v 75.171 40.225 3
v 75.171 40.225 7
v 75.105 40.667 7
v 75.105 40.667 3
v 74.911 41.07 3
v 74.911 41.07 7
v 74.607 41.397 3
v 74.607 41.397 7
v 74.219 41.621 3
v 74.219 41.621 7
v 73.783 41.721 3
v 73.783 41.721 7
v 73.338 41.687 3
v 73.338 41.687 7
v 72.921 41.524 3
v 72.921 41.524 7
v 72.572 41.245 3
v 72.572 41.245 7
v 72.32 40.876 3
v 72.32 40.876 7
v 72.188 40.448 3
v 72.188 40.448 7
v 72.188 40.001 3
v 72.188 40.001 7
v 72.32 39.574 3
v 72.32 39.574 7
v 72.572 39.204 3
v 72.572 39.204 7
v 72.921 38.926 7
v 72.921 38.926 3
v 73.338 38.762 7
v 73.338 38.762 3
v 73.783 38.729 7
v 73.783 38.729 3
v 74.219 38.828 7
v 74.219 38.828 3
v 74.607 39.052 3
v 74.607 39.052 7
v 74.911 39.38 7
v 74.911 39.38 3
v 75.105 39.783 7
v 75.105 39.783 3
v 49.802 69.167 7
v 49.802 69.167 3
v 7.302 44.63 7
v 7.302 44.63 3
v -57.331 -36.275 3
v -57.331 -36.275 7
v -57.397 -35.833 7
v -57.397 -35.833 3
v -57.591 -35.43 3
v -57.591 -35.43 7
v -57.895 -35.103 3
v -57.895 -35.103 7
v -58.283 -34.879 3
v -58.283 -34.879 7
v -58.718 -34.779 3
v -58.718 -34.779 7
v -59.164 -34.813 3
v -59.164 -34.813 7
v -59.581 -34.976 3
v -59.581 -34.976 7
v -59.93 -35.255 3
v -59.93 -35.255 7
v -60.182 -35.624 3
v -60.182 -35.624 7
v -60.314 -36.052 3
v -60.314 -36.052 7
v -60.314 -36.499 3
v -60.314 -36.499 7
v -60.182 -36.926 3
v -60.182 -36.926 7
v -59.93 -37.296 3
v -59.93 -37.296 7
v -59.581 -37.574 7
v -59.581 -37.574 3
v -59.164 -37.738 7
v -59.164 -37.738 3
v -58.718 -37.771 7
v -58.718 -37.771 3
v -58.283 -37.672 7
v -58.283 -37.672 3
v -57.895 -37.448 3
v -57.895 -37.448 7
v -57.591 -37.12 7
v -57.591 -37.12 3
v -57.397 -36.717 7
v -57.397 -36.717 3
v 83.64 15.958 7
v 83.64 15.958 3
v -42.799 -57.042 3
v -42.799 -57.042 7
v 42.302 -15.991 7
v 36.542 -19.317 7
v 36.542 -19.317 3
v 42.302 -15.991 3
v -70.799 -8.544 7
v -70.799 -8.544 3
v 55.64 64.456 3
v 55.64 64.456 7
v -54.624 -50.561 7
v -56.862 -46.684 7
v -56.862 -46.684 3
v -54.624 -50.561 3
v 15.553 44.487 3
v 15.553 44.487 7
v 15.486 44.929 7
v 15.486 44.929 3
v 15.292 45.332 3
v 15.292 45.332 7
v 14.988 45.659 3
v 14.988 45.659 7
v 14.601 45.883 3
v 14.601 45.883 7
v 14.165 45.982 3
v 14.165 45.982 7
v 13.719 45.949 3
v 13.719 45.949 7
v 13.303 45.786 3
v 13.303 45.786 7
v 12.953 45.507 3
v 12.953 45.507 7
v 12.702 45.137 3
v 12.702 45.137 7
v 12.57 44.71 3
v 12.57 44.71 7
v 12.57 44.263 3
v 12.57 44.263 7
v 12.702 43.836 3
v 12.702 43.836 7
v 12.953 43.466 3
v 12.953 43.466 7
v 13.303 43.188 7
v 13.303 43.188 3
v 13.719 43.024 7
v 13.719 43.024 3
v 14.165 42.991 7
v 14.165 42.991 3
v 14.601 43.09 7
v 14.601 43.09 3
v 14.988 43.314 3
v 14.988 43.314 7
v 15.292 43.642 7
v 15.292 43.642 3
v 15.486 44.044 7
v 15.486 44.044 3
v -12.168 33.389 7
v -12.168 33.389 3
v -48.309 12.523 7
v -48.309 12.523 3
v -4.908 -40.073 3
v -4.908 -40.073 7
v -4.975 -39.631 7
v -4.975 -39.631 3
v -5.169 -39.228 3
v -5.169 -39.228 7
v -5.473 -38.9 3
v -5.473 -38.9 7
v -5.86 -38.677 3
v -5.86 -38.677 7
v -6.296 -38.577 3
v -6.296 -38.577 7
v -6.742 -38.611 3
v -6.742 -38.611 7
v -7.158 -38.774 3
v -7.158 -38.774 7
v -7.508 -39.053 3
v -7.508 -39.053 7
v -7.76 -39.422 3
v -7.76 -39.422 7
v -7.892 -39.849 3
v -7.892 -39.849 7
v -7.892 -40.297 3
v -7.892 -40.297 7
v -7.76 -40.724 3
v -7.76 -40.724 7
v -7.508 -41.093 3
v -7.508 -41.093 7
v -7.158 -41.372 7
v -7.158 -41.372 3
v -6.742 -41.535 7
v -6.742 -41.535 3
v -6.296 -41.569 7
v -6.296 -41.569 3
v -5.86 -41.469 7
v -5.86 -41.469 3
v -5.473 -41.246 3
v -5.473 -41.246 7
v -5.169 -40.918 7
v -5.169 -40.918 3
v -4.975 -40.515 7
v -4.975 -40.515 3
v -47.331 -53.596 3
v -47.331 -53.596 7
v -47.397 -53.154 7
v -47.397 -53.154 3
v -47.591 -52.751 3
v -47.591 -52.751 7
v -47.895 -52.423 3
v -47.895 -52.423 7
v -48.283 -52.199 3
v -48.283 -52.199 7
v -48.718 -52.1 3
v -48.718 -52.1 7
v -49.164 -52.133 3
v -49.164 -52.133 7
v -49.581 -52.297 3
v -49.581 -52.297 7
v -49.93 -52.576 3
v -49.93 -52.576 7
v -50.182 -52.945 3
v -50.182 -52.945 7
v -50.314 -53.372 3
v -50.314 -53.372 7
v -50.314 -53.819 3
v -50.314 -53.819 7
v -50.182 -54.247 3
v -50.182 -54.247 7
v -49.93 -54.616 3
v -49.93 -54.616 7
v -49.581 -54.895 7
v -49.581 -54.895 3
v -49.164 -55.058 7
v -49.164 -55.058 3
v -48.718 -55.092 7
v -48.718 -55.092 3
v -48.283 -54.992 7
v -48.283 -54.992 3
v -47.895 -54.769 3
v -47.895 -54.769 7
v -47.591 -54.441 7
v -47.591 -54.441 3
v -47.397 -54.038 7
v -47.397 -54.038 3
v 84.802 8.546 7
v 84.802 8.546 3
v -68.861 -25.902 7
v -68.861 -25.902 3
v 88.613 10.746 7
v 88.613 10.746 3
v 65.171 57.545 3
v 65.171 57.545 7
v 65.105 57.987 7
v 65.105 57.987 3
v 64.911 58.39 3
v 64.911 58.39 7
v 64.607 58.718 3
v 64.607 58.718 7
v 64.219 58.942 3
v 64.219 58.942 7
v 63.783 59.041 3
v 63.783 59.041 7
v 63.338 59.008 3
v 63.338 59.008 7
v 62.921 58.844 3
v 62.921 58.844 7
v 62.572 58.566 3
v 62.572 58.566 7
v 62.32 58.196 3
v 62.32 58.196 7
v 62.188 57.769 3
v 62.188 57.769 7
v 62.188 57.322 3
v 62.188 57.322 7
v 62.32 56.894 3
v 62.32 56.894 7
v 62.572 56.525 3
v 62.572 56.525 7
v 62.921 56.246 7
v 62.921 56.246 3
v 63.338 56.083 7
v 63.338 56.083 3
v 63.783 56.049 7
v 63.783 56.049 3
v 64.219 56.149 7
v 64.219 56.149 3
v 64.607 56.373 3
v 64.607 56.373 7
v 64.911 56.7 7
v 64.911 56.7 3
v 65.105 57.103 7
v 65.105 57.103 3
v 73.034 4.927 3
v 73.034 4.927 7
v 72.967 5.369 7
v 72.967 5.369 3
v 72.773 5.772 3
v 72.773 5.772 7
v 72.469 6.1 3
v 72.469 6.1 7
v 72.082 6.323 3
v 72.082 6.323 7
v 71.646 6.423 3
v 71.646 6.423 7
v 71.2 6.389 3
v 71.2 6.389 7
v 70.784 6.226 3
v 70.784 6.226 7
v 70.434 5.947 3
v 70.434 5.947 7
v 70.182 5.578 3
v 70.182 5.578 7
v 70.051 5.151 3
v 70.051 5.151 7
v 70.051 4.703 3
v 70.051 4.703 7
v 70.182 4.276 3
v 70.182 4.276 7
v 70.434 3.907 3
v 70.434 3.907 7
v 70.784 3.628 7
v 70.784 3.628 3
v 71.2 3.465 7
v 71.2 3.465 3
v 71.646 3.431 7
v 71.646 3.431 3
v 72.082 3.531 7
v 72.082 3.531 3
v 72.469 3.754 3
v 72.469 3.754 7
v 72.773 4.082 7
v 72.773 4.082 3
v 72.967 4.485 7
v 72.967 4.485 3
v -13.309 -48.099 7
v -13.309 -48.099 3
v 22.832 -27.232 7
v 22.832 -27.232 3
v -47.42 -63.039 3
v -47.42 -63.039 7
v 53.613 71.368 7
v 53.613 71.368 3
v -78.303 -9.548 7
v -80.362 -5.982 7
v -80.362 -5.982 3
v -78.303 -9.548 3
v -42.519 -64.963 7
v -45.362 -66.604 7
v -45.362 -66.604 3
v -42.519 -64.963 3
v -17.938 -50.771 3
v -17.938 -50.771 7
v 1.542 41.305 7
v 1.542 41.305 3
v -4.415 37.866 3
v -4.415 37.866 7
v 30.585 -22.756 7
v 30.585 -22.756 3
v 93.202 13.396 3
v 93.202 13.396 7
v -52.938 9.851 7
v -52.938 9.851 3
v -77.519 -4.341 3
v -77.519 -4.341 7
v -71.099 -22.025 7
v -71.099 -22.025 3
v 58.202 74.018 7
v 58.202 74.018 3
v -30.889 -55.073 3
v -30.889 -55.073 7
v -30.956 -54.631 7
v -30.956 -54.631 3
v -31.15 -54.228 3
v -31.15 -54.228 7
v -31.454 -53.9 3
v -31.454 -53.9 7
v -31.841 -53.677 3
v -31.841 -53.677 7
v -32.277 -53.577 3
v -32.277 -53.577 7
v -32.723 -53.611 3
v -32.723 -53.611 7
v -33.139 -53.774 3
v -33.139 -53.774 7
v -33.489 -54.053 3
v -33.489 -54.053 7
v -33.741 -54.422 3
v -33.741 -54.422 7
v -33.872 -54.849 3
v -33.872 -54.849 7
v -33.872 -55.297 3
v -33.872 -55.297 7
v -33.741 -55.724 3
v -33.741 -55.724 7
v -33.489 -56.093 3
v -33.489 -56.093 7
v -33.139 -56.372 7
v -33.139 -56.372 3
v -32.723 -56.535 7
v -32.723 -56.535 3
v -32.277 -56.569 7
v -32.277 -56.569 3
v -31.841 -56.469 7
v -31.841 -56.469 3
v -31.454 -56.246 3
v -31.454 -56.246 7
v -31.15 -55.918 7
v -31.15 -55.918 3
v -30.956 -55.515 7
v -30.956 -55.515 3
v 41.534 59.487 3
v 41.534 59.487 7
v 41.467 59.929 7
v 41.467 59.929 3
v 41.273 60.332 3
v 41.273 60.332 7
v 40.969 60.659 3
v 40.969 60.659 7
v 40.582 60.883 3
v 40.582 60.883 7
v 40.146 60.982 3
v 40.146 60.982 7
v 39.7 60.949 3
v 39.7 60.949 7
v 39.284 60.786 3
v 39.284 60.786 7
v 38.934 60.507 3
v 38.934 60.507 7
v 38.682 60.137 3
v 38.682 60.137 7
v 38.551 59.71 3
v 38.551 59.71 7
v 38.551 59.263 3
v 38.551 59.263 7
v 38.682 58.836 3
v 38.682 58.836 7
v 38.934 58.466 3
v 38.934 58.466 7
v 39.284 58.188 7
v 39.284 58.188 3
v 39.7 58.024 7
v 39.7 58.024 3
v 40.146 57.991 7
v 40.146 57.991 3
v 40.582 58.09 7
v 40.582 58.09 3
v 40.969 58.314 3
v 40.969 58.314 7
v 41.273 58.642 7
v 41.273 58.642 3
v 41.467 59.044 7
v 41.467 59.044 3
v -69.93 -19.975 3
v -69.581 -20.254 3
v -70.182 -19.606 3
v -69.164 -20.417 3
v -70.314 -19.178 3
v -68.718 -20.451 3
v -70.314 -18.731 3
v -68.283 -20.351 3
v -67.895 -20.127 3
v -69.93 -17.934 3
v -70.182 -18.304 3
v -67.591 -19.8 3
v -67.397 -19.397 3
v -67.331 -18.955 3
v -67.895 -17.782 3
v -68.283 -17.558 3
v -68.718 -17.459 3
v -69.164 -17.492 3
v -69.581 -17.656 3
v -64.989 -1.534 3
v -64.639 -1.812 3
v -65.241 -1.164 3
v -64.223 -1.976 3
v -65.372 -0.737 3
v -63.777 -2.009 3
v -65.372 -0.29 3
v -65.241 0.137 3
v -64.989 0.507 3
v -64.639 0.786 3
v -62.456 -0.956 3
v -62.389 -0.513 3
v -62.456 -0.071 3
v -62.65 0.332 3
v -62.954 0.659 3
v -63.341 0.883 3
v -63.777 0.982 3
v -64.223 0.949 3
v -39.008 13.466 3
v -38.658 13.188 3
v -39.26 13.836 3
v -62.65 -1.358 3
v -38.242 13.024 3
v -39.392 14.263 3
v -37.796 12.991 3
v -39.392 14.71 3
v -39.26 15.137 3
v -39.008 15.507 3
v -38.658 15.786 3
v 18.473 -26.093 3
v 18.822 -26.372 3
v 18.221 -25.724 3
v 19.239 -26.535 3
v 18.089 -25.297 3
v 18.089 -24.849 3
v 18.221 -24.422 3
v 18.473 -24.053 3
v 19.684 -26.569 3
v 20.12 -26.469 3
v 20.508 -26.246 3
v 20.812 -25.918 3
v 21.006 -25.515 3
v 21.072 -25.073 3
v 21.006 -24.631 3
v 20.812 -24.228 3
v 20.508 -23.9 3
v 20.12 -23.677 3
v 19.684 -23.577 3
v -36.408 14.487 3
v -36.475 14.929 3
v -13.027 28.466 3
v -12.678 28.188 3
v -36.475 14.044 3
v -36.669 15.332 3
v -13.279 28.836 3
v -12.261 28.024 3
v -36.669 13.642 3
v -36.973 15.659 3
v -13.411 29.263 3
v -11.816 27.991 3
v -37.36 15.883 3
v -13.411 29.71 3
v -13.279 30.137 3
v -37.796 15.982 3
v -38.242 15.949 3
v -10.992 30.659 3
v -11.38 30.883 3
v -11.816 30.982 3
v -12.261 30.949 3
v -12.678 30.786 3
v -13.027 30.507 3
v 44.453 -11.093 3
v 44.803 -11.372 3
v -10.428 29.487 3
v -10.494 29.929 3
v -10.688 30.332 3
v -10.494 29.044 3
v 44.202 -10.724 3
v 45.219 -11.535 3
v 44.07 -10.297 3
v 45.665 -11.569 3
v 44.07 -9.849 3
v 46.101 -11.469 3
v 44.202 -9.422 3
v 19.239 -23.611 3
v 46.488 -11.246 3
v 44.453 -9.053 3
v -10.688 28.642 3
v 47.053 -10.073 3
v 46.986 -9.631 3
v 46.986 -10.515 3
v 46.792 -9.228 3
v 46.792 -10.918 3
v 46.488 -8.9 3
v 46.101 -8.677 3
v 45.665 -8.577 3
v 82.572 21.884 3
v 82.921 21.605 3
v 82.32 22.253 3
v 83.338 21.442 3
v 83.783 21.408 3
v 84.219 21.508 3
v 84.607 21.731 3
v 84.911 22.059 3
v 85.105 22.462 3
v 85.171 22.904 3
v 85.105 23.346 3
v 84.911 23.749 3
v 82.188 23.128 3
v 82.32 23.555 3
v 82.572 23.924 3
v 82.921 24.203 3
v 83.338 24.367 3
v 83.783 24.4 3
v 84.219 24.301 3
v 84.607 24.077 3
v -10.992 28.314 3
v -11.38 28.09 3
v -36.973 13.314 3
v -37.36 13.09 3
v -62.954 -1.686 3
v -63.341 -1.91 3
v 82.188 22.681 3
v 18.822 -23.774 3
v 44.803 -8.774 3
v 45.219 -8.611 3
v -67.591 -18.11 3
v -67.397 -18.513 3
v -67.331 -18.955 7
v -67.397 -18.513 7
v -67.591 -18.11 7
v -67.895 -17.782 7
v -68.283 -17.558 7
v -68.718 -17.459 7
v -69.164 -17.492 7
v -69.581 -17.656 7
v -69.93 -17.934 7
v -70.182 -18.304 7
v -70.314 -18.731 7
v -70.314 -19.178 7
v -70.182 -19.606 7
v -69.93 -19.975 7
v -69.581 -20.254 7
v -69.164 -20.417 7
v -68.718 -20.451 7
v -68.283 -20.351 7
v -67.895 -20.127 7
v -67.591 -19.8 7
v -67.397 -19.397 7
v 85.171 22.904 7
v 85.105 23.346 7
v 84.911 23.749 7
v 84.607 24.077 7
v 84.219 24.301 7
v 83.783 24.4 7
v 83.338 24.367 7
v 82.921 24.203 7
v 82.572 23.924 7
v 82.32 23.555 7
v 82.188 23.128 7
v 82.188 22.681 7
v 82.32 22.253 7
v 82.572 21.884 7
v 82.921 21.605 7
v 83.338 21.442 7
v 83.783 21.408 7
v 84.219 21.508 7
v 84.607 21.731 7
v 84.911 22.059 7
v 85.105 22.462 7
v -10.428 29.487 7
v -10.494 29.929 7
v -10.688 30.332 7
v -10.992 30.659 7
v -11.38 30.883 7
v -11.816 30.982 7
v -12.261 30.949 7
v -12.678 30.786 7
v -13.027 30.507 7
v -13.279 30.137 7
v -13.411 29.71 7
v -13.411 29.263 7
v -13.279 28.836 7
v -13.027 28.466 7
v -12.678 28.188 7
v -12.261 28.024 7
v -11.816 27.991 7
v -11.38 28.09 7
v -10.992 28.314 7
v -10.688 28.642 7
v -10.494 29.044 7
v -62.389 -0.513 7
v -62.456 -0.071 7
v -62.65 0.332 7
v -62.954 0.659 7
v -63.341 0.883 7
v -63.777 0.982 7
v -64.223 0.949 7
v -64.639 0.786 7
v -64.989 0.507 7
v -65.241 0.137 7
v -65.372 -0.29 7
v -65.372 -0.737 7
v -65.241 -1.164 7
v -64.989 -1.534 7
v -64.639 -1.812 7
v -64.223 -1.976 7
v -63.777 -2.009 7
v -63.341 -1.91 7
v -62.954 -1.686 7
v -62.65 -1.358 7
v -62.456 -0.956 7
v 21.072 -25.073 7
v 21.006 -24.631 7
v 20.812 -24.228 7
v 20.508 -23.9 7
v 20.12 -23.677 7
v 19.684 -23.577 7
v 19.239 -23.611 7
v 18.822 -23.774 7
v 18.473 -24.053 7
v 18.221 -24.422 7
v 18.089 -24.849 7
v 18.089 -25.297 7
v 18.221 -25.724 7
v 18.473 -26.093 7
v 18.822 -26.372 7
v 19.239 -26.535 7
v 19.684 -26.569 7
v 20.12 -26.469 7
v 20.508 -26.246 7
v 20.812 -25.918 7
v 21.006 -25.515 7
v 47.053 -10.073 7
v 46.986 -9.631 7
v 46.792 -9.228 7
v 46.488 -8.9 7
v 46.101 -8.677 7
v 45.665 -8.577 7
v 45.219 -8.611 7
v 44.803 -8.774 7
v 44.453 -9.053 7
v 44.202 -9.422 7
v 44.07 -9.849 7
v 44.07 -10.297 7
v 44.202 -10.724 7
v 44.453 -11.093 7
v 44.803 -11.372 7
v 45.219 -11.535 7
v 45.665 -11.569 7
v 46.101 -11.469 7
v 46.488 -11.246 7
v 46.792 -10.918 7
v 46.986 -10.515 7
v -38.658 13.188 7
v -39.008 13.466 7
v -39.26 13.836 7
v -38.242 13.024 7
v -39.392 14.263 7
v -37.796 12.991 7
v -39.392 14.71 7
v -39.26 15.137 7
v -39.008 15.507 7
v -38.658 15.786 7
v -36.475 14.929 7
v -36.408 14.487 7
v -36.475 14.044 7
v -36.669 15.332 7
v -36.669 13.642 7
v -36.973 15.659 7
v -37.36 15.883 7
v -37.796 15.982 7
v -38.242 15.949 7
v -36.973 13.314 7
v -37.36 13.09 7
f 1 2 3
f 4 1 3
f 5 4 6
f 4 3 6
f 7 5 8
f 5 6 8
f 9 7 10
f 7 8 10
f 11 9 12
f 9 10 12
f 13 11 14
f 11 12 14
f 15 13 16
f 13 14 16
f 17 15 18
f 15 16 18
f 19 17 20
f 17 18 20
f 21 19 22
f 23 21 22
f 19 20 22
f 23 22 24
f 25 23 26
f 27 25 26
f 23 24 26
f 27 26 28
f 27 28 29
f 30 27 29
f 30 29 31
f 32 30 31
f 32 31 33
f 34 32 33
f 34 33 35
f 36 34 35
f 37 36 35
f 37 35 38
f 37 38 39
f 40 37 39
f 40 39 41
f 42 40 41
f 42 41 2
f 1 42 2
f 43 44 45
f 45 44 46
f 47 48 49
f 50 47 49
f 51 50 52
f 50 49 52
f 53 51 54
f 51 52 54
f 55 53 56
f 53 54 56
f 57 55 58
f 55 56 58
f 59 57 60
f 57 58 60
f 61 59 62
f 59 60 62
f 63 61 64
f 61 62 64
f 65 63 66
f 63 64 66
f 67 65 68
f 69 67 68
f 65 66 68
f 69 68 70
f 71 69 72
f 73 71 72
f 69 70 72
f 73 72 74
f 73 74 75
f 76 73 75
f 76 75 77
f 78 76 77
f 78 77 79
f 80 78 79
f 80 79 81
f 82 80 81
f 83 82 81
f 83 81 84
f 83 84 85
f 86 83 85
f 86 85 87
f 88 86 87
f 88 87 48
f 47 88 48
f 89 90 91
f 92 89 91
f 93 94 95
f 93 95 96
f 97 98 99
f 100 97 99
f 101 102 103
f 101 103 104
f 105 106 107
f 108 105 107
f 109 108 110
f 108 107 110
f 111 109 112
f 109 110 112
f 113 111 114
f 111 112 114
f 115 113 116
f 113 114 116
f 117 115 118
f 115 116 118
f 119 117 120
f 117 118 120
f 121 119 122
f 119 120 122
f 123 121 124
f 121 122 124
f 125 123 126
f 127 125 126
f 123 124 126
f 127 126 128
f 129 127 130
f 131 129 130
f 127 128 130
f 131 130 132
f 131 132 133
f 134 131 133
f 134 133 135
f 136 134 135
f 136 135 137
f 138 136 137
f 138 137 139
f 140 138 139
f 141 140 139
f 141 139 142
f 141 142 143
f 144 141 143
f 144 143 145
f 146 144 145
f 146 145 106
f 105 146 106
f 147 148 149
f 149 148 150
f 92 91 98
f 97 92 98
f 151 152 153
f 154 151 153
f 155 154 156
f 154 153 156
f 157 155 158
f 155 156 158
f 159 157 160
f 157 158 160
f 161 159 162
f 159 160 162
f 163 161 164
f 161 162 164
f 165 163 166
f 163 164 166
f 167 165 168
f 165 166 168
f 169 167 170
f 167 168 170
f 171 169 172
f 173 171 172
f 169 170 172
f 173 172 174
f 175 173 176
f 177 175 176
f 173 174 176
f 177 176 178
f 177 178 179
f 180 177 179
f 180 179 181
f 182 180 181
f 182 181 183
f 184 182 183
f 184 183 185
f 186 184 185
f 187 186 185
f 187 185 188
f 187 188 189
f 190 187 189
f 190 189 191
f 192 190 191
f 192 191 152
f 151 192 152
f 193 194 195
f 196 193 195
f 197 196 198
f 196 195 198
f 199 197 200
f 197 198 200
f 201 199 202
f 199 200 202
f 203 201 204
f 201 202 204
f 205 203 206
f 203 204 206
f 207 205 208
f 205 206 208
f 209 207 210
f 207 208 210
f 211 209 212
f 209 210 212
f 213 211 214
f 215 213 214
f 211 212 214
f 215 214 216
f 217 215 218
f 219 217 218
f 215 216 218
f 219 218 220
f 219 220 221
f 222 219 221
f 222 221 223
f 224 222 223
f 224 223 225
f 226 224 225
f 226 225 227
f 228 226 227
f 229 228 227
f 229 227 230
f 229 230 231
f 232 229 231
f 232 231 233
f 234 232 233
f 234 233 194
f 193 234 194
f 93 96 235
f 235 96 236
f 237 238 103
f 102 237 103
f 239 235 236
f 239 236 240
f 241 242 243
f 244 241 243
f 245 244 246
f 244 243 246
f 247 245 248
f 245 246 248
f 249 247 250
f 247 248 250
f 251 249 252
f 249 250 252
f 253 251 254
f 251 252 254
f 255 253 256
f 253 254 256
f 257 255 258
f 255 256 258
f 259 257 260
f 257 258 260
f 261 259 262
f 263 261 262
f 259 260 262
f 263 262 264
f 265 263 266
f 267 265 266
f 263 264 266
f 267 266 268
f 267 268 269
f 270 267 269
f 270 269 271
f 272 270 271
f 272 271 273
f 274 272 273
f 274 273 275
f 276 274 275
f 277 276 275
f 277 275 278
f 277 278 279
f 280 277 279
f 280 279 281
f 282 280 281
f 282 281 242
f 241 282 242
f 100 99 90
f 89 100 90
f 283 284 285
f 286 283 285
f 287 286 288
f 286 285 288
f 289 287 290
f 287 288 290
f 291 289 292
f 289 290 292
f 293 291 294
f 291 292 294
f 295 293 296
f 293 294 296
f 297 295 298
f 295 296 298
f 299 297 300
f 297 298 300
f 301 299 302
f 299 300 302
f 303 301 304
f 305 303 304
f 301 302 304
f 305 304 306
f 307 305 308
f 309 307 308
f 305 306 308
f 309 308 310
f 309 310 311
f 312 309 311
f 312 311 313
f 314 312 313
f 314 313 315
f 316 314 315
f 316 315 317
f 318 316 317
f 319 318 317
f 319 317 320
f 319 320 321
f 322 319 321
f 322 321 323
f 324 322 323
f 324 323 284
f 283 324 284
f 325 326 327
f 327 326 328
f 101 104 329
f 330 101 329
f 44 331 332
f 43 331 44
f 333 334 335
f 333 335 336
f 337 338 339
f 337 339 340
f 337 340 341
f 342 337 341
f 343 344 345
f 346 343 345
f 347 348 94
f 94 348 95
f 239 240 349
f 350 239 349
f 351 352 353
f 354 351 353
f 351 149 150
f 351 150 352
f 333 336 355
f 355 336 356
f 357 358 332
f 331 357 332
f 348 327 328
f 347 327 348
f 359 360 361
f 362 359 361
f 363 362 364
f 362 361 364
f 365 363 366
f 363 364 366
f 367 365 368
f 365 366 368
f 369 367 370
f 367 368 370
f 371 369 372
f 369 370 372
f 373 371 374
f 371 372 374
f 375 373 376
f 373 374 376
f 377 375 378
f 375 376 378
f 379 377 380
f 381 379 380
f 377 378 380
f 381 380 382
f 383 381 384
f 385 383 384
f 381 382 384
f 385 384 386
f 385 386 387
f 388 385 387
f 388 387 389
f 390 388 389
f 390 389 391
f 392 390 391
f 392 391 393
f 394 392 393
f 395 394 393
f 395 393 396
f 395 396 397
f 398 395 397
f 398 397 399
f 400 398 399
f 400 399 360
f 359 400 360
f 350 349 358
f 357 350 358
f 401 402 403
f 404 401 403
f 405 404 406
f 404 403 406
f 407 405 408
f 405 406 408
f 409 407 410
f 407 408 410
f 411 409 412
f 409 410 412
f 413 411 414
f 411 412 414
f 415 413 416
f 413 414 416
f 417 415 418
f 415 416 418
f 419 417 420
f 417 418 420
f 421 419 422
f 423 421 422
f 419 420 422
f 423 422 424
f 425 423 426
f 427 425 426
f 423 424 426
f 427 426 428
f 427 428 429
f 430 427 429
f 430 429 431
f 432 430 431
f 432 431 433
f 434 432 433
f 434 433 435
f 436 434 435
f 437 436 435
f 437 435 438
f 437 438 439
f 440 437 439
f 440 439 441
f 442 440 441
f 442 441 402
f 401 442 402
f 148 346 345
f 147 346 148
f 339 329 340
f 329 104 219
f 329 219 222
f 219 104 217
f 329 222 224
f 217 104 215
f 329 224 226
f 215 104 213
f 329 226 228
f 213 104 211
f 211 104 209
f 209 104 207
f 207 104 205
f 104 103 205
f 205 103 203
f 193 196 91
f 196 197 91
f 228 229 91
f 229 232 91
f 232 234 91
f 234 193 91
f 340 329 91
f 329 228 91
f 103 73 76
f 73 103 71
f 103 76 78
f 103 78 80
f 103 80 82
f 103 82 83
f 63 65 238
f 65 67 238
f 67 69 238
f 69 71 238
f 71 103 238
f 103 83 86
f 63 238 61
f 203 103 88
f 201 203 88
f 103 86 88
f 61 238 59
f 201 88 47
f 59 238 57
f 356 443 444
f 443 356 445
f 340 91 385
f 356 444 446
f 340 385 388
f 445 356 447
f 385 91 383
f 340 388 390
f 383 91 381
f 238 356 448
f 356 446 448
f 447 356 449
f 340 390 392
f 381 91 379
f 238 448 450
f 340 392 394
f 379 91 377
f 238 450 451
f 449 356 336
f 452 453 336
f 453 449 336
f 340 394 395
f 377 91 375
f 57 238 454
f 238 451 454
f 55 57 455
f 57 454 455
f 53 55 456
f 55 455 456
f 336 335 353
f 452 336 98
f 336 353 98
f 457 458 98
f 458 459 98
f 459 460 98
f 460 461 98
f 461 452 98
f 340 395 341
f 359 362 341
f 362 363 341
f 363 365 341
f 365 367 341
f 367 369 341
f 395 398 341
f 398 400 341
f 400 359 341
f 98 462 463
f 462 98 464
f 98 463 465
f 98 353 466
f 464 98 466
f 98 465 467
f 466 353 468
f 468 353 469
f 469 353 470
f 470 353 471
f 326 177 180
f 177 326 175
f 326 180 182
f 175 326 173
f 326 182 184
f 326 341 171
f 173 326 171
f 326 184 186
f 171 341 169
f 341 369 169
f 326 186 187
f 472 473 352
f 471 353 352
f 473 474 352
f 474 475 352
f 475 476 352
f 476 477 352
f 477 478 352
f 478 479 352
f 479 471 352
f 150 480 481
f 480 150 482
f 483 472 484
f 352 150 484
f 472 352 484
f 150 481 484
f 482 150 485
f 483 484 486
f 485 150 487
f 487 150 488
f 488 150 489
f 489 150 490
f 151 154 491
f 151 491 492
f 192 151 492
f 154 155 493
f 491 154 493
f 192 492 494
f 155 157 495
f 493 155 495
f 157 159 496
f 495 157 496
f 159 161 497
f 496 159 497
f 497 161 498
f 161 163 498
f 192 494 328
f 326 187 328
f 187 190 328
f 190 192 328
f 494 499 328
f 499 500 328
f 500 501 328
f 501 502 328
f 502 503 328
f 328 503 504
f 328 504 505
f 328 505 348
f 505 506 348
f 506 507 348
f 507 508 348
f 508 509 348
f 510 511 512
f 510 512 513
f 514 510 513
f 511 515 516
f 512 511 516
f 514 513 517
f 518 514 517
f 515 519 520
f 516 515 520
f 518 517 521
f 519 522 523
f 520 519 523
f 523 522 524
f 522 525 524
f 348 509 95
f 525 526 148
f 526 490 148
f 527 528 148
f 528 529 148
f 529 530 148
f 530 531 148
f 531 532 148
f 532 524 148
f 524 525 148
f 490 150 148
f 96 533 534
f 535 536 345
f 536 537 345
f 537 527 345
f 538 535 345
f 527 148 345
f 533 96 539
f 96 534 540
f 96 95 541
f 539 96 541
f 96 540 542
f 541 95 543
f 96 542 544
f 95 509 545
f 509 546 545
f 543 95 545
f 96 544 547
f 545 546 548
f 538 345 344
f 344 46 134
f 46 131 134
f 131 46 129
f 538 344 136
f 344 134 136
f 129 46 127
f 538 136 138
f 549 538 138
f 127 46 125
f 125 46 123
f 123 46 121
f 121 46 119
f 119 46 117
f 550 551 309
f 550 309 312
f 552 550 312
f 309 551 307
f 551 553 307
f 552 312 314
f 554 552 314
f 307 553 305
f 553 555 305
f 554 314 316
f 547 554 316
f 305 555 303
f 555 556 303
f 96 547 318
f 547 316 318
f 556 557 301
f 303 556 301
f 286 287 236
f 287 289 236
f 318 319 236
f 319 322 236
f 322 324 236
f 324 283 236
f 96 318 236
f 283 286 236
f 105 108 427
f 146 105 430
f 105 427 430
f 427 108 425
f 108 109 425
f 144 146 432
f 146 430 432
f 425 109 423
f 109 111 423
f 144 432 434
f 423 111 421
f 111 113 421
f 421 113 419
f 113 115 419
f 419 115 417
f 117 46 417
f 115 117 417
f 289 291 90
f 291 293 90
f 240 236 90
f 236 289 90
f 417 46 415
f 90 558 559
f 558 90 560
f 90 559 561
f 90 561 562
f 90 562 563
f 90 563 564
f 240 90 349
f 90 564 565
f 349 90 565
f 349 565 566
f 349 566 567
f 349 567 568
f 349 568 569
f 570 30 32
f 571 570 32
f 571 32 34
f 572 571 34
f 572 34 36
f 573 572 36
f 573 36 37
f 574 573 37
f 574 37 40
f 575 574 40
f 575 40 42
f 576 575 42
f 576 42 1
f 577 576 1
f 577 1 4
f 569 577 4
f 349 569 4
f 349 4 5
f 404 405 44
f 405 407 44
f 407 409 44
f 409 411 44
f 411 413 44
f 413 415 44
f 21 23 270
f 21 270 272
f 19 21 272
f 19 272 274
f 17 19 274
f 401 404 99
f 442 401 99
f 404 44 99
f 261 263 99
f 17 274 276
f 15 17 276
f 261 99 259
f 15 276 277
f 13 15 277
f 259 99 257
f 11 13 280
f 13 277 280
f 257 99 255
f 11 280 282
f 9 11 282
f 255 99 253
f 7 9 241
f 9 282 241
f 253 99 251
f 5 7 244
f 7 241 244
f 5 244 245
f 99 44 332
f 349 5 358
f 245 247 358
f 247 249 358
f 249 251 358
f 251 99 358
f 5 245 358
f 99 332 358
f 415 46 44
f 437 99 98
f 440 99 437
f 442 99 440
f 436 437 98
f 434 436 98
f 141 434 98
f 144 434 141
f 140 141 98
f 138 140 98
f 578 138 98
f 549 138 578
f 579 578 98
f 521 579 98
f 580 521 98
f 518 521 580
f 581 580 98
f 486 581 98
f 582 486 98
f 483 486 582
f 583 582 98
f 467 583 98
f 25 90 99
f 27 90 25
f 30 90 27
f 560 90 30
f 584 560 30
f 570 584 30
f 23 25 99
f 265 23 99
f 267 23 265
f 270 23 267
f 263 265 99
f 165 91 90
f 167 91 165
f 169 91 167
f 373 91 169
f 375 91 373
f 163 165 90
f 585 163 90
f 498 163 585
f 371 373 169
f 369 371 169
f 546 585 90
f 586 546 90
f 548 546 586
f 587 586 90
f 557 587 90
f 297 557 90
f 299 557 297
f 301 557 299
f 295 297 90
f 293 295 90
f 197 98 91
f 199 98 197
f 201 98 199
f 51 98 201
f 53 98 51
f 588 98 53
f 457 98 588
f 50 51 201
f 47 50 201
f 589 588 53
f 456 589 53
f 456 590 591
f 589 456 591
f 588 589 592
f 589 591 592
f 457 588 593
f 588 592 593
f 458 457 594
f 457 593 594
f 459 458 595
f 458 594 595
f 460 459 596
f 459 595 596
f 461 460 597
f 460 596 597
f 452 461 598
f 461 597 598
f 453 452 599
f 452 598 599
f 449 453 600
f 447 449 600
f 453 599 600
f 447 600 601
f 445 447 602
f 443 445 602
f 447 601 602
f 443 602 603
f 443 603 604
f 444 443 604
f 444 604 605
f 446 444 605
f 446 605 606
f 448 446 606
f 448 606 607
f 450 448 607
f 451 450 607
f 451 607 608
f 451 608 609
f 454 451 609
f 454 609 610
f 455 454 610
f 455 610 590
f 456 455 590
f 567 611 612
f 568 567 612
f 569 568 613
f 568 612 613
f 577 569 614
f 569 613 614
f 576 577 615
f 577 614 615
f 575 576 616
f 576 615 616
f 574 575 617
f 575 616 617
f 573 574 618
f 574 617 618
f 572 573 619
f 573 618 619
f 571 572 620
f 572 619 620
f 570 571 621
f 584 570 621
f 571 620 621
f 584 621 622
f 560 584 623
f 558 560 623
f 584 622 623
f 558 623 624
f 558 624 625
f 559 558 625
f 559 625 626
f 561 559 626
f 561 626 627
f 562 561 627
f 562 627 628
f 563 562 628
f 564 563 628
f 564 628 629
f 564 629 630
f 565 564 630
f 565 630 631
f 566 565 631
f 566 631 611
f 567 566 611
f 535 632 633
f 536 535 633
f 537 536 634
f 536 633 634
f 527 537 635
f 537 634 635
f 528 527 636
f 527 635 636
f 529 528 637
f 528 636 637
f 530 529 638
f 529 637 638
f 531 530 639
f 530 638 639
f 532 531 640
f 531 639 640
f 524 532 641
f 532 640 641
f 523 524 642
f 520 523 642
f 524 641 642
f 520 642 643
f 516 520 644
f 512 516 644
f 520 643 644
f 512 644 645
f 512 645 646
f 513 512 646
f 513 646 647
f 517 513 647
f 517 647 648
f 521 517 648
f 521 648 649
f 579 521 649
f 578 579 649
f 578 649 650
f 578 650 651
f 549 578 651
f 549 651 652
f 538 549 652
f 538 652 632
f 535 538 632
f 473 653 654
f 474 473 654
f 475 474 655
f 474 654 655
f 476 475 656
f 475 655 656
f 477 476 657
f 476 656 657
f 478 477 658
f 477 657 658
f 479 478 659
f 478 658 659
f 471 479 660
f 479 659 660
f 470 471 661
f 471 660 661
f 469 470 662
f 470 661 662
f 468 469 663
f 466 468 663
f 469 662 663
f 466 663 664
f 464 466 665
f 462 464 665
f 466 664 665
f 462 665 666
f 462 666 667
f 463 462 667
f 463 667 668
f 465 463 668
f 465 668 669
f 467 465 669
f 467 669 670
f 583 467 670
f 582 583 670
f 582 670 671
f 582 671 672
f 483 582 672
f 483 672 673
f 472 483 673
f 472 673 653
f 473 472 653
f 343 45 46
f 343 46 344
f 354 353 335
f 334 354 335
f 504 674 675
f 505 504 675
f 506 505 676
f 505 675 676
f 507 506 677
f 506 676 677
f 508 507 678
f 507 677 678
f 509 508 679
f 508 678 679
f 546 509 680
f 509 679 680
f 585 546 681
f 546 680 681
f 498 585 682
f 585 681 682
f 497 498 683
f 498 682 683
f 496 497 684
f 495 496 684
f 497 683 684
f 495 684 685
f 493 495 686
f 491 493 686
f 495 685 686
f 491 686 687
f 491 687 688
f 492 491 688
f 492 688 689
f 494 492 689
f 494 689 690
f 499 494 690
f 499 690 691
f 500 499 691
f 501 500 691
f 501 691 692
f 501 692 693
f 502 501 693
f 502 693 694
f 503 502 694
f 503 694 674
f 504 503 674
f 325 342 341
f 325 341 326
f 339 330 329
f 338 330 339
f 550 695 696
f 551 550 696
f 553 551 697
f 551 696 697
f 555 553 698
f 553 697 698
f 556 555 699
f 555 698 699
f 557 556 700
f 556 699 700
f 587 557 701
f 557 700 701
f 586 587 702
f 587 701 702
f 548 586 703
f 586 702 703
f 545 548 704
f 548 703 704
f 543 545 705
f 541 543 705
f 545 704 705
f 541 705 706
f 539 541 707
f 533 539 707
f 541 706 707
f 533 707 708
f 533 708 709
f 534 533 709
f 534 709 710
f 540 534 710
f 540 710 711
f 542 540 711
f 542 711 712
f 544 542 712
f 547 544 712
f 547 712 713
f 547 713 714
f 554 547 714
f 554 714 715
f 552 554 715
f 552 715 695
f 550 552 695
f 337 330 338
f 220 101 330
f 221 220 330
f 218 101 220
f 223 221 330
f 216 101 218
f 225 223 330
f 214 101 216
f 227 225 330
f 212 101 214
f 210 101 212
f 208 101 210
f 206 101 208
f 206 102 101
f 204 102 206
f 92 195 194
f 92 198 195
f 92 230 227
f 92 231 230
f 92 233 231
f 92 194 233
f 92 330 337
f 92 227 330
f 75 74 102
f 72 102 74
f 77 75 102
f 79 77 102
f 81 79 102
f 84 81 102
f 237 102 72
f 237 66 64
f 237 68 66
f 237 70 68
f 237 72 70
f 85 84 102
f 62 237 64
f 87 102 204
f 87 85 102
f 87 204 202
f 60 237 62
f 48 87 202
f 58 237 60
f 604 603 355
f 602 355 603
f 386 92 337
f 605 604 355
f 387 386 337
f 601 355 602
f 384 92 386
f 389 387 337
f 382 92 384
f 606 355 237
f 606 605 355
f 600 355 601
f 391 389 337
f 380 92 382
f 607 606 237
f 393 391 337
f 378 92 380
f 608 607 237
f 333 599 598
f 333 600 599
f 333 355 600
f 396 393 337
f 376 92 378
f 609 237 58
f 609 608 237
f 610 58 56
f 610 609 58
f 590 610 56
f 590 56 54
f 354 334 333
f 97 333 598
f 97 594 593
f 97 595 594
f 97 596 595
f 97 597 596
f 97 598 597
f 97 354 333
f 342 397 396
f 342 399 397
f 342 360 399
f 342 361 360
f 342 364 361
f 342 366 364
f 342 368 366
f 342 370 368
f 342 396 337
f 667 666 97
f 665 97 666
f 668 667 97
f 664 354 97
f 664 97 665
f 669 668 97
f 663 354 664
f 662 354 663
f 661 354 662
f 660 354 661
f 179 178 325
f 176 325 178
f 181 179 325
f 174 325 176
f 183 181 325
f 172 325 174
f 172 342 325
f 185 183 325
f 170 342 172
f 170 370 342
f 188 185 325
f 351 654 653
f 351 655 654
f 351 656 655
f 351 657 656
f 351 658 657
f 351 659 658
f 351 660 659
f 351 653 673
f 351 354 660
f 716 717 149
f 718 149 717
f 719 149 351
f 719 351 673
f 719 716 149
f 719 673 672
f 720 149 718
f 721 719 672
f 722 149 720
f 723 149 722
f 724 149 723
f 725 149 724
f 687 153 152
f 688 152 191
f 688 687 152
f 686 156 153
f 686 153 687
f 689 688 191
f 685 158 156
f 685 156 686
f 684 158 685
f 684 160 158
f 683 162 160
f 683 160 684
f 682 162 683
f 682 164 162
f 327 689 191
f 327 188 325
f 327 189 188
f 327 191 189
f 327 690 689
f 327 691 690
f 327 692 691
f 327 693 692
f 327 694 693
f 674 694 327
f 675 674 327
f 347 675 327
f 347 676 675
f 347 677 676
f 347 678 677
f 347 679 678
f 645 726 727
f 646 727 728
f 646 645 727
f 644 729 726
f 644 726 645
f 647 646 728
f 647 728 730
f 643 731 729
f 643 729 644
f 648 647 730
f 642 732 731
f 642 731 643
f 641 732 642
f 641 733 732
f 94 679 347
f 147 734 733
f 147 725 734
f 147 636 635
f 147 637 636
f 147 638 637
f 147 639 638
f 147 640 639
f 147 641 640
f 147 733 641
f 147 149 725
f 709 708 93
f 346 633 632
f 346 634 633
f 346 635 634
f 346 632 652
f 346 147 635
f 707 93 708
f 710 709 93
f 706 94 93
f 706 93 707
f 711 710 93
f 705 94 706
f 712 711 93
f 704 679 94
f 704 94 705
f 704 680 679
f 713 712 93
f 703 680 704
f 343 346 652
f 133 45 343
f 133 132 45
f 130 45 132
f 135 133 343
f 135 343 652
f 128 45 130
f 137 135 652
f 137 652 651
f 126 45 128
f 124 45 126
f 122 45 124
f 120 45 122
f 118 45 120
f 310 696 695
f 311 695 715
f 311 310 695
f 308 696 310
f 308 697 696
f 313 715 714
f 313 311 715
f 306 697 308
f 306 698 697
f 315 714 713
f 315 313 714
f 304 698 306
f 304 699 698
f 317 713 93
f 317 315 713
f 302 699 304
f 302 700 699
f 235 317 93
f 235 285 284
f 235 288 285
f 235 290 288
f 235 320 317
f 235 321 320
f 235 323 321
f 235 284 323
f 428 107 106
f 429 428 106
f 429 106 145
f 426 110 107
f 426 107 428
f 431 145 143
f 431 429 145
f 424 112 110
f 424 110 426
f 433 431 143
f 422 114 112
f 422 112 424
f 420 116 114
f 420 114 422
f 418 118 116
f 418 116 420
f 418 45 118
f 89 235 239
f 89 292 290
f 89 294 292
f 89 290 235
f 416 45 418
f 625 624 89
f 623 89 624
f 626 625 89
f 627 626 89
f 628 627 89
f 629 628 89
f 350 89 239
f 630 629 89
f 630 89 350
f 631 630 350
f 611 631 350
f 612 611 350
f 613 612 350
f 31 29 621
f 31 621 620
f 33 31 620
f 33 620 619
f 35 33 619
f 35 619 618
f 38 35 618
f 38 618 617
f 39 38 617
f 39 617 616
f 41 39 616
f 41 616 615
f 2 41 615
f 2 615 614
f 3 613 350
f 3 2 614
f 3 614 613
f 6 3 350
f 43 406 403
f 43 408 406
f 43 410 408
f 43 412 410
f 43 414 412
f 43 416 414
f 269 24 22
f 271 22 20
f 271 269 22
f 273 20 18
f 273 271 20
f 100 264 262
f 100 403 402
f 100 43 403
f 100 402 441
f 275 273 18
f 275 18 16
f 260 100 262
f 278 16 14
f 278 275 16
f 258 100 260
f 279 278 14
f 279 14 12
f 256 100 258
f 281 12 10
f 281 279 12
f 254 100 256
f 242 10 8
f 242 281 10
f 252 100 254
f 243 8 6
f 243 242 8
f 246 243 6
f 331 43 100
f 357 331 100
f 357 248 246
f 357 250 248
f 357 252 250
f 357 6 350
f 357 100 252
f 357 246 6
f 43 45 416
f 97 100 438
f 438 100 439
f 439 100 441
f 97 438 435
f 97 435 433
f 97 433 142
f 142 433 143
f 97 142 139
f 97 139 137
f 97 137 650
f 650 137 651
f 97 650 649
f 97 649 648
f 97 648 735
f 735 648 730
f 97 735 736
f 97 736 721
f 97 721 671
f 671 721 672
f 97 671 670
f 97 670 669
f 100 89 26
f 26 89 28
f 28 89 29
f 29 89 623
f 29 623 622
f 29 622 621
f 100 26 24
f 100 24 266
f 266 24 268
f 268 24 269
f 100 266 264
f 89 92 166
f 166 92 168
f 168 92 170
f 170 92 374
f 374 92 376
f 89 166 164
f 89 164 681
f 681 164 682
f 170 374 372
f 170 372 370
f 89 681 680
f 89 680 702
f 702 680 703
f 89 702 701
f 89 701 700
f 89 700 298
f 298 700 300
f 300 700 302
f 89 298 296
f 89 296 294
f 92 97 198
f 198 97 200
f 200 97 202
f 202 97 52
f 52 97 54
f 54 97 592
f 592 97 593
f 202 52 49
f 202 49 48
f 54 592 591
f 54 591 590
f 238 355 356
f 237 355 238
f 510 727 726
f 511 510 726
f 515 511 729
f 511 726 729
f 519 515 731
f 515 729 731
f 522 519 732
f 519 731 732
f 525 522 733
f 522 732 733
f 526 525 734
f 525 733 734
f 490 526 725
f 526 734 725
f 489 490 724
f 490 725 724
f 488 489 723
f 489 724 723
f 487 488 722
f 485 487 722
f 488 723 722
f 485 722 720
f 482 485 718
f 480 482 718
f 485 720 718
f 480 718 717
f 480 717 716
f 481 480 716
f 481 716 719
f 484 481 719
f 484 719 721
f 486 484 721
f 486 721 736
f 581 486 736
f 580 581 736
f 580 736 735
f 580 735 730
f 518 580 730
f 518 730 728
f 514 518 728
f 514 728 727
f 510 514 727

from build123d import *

# Parameters (mm, degrees)
SKETCH_1_R           = 1.5
SKETCH_1_R_2         = 69.25
EXTRUDE_1_DEPTH      = 3
SKETCH_2_R           = 1.5
CUT_EXTRUDE_1_DEPTH  = 10
EXTRUDE_4_DEPTH      = 30
SKETCH_21_R          = 1.5
CUT_EXTRUDE_16_DEPTH = 264.511765735
SKETCH_22_R          = 1.5
CUT_EXTRUDE_17_DEPTH = 15
EXTRUDE_5_DEPTH      = 13
SKETCH_25_R          = 1.5
CUT_EXTRUDE_18_DEPTH = 8
SKETCH_26_R          = 1.5
CUT_EXTRUDE_19_DEPTH = 265
EXTRUDE_6_DEPTH      = 10
CUT_EXTRUDE_20_DEPTH = 265
EXTRUDE_8_DEPTH      = 10
SKETCH_31_R          = 1.5
CUT_EXTRUDE_22_DEPTH = 265
SKETCH_32_W          = 406.044805538
SKETCH_32_H          = 345.897022528
CUT_EXTRUDE_23_DEPTH = 265
CUT_EXTRUDE_24_DEPTH = 79
SKETCH_34_W          = 228.886402988
SKETCH_34_H          = 166.453973012
CUT_EXTRUDE_25_DEPTH = 6


with BuildPart() as part:
    # Sketch 1 → Extrude 1 (new body)
    with BuildSketch(Plane.XY):
        with BuildLine():
            Line((-22.769302312, -105.521905889), (96.897661611, -36.432152055))
            Line((96.897661611, -36.432152055), (159.096032483, -0.521905889))
            ThreePointArc((159.096032483, -0.521905889), (163.755290746, 5.550157697), (162.756286521, 13.138348148))
            Line((162.756286521, 13.138348148), (92.756286521, 134.381904678))
            ThreePointArc((92.756286521, 134.381904678), (86.684222934, 139.041162941), (79.096032483, 138.042158716))
            Line((79.096032483, 138.042158716), (16.897661611, 102.13191255))
            Line((16.897661611, 102.13191255), (-102.769302312, 33.042158716))
            ThreePointArc((-102.769302312, 33.042158716), (-133.627927222, -77.150119753), (-22.769302312, -105.521905889))
        make_face()
        with Locations((0, 74.563800918)):
            Circle(SKETCH_1_R, mode=Mode.SUBTRACT)
        with Locations((64.574145798, -37.281900459)):
            Circle(SKETCH_1_R, mode=Mode.SUBTRACT)
        with Locations((-64.574145798, -37.281900459)):
            Circle(SKETCH_1_R, mode=Mode.SUBTRACT)
        Circle(SKETCH_1_R_2, mode=Mode.SUBTRACT)
    extrude(amount=EXTRUDE_1_DEPTH)

    # Sketch 2 → Cut-Extrude 1 (cut)
    with BuildSketch(Plane(origin=(0, 0, 0), x_dir=(-1, 0, 0), z_dir=(0, 0, -1))):
        with Locations((-109.955016331, 4.59283082)):
            Circle(SKETCH_2_R)
        with Locations((-130.739626022, 16.59283082)):
            Circle(SKETCH_2_R)
        with Locations((-58.955016331, 92.927422006)):
            Circle(SKETCH_2_R)
        with Locations((-79.739626022, 104.927422006)):
            Circle(SKETCH_2_R)
    extrude(amount=-CUT_EXTRUDE_1_DEPTH, mode=Mode.SUBTRACT)

    # Sketch 20 → Extrude 4 (add)
    with BuildSketch(Plane(origin=(0, 0, 0), x_dir=(-1, 0, 0), z_dir=(0, 0, -1))):
        with BuildLine():
            Line((-92.756286521, 134.381904678), (-162.756286521, 13.138348148))
            ThreePointArc((-162.756286521, 13.138348148), (-163.755290746, 5.550157697), (-159.096032483, -0.521905889))
            Line((-159.096032483, -0.521905889), (22.769302312, -105.521905889))
            ThreePointArc((22.769302312, -105.521905889), (133.627927222, -77.150119753), (102.769302312, 33.042158716))
            Line((102.769302312, 33.042158716), (-79.096032483, 138.042158716))
            ThreePointArc((-79.096032483, 138.042158716), (-86.684222934, 139.041162941), (-92.756286521, 134.381904678))
        make_face()
        with BuildLine():
            Line((-89.292184905, 132.381904678), (-159.292184905, 11.138348148))
            ThreePointArc((-159.292184905, 11.138348148), (-159.89158744, 6.585433878), (-157.096032483, 2.942195726))
            Line((-157.096032483, 2.942195726), (24.808773358, -102.080592893))
            ThreePointArc((24.808773358, -102.080592893), (130.163825607, -75.150119753), (100.808773358, 29.555268482))
            Line((100.808773358, 29.555268482), (-81.096032483, 134.578057101))
            ThreePointArc((-81.096032483, 134.578057101), (-85.648946753, 135.177459636), (-89.292184905, 132.381904678))
        make_face(mode=Mode.SUBTRACT)
    extrude(amount=EXTRUDE_4_DEPTH)

    # Sketch 21 → Cut-Extrude 16 (cut, through all)
    with BuildSketch(Plane(origin=(-40, 69.282032303, 0), x_dir=(0.866025404, 0.5, 0), z_dir=(-0.5, 0.866025404, 0))):
        with Locations((-62.479747173, 25)):
            Circle(SKETCH_21_R)
        with Locations((-32.479747173, 25)):
            Circle(SKETCH_21_R)
        with Locations((-2.479747173, 25)):
            Circle(SKETCH_21_R)
        with Locations((27.520252827, 25)):
            Circle(SKETCH_21_R)
        with Locations((57.520252827, 25)):
            Circle(SKETCH_21_R)
        with Locations((87.520252827, 25)):
            Circle(SKETCH_21_R)
        with Locations((117.520252827, 25)):
            Circle(SKETCH_21_R)
    extrude(amount=-CUT_EXTRUDE_16_DEPTH, mode=Mode.SUBTRACT)

    # Sketch 22 → Cut-Extrude 17 (cut)
    with BuildSketch(Plane(origin=(127.756286521, 73.760126413, 0), x_dir=(0, 0, -1), z_dir=(0.866025404, 0.5, 0))):
        with Locations((25, 60)):
            Circle(SKETCH_22_R)
        with Locations((25, 30)):
            Circle(SKETCH_22_R)
        with Locations((25, 0)):
            Circle(SKETCH_22_R)
        with Locations((25, -30)):
            Circle(SKETCH_22_R)
        with Locations((25, -60)):
            Circle(SKETCH_22_R)
    extrude(amount=-CUT_EXTRUDE_17_DEPTH, mode=Mode.SUBTRACT)

    # Sketch 23 → Extrude 5 (add)
    with BuildSketch(Plane(origin=(0, 0, 0), x_dir=(-1, 0, 0), z_dir=(0, 0, -1))):
        with BuildLine():
            Line((100.710773859, 29.380908411), (-81.196032483, 134.40485202))
            ThreePointArc((-81.196032483, 134.40485202), (-85.597182944, 134.984274471), (-89.118979825, 132.281904678))
            Line((-89.118979825, 132.281904678), (-159.118979825, 11.038348148))
            ThreePointArc((-159.118979825, 11.038348148), (-159.698402275, 6.637197687), (-156.996032483, 3.115400806))
            Line((-156.996032483, 3.115400806), (24.910773859, -101.908542802))
            ThreePointArc((24.910773859, -101.908542802), (129.990620526, -75.050119753), (100.710773859, 29.380908411))
        make_face()
        with BuildLine():
            Line((98.261672903, 25.021394816), (-83.696032483, 130.074725001))
            ThreePointArc((-83.696032483, 130.074725001), (-84.303087719, 130.154645339), (-84.788852806, 129.781904678))
            Line((-84.788852806, 129.781904678), (-154.788852806, 8.538348148))
            ThreePointArc((-154.788852806, 8.538348148), (-154.868773144, 7.931292912), (-154.496032483, 7.445527825))
            Line((-154.496032483, 7.445527825), (27.461672903, -97.60780236))
            ThreePointArc((27.461672903, -97.60780236), (125.660493508, -72.550119753), (98.261672903, 25.021394816))
        make_face(mode=Mode.SUBTRACT)
    extrude(amount=-EXTRUDE_5_DEPTH)

    # Sketch 25 → Cut-Extrude 18 (cut)
    with BuildSketch(Plane(origin=(124.118979825, 71.660126413, 0), x_dir=(0, 0, -1), z_dir=(0.866025404, 0.5, 0))):
        with Locations((-8, 60)):
            Circle(SKETCH_25_R)
        with Locations((-8, 30)):
            Circle(SKETCH_25_R)
        with Locations((-8, 0)):
            Circle(SKETCH_25_R)
        with Locations((-8, -30)):
            Circle(SKETCH_25_R)
        with Locations((-8, -60)):
            Circle(SKETCH_25_R)
    extrude(amount=-CUT_EXTRUDE_18_DEPTH, mode=Mode.SUBTRACT)

    # Sketch 26 → Cut-Extrude 19 (cut)
    with BuildSketch(Plane(origin=(-37.9, 65.644725607, 0), x_dir=(0.866025404, 0.5, 0), z_dir=(-0.5, 0.866025404, 0))):
        with Locations((-62.479747173, -8)):
            Circle(SKETCH_26_R)
        with Locations((-32.479747173, -8)):
            Circle(SKETCH_26_R)
        with Locations((-2.479747173, -8)):
            Circle(SKETCH_26_R)
        with Locations((27.520252827, -8)):
            Circle(SKETCH_26_R)
        with Locations((57.520252827, -8)):
            Circle(SKETCH_26_R)
        with Locations((87.520252827, -8)):
            Circle(SKETCH_26_R)
        with Locations((117.520252827, -8)):
            Circle(SKETCH_26_R)
    extrude(amount=-CUT_EXTRUDE_19_DEPTH, mode=Mode.SUBTRACT)

    # Sketch 27 → Extrude 6 (add)
    with BuildSketch(Plane.XY.offset(3)):
        Polygon((-45.361672903, -66.604092905), (93.202391703, 13.395907095), (58.202391703, 74.01768536), (-80.361672903, -5.98231464), align=None)
        Polygon((55.640213876, 64.455507534), (83.640213876, 15.958084922), (-42.799495076, -57.041915078), (-70.799495076, -8.544492466), align=None, mode=Mode.SUBTRACT)
    extrude(amount=EXTRUDE_6_DEPTH)

    # Sketch 28 → Cut-Extrude 20 (cut)
    with BuildSketch(Plane.XY.offset(13)):
        Polygon((-15.72564869, -92.217646268), (-14.42564869, -94.469312318), (-19.275390952, -97.269312318), (-20.575390952, -95.017646268), align=None)
        Polygon((6.705371162, -82.269312318), (11.555113423, -79.469312318), (10.255113423, -77.217646268), (5.405371162, -80.017646268), align=None)
        Polygon((32.686133275, -67.269312318), (37.535875537, -64.469312318), (36.235875537, -62.217646268), (31.386133275, -65.017646268), align=None)
        Polygon((58.666895389, -52.269312318), (63.51663765, -49.469312318), (62.21663765, -47.217646268), (57.366895389, -50.017646268), align=None)
        Polygon((84.647657503, -37.269312318), (89.497399764, -34.469312318), (88.197399764, -32.217646268), (83.347657503, -35.017646268), align=None)
        Polygon((110.628419616, -22.269312318), (115.478161877, -19.469312318), (114.178161877, -17.217646268), (109.328419616, -20.017646268), align=None)
        Polygon((136.60918173, -7.269312318), (141.458923991, -4.469312318), (140.158923991, -2.217646268), (135.30918173, -5.017646268), align=None)
        Polygon((63.30918173, 119.690011877), (62.00918173, 121.941677927), (66.858923991, 124.741677927), (68.158923991, 122.490011877), align=None)
        Polygon((37.328419616, 104.690011877), (36.028419616, 106.941677927), (40.878161877, 109.741677927), (42.178161877, 107.490011877), align=None)
        Polygon((11.347657503, 89.690011877), (10.047657503, 91.941677927), (14.897399764, 94.741677927), (16.197399764, 92.490011877), align=None)
        Polygon((-14.633104611, 74.690011877), (-15.933104611, 76.941677927), (-11.08336235, 79.741677927), (-9.78336235, 77.490011877), align=None)
        Polygon((-40.613866724, 59.690011877), (-41.913866724, 61.941677927), (-37.064124463, 64.741677927), (-35.764124463, 62.490011877), align=None)
        Polygon((-93.875390952, 31.941677927), (-89.02564869, 34.741677927), (-87.72564869, 32.490011877), (-92.575390952, 29.690011877), align=None)
        Polygon((-66.594628838, 44.690011877), (-67.894628838, 46.941677927), (-63.044886577, 49.741677927), (-61.744886577, 47.490011877), align=None)
        Polygon((149.42808329, 20.223473317), (152.22808329, 15.373731056), (154.47974934, 16.673731056), (151.67974934, 21.523473317), align=None)
        Polygon((139.47974934, 42.654493169), (136.67974934, 47.50423543), (134.42808329, 46.20423543), (137.22808329, 41.354493169), align=None)
        Polygon((124.47974934, 68.635255283), (121.67974934, 73.484997544), (119.42808329, 72.184997544), (122.22808329, 67.335255283), align=None)
        Polygon((109.47974934, 94.616017396), (106.67974934, 99.465759657), (104.42808329, 98.165759657), (107.22808329, 93.316017396), align=None)
        Polygon((94.47974934, 120.59677951), (91.67974934, 125.446521771), (89.42808329, 124.146521771), (92.22808329, 119.29677951), align=None)
    extrude(amount=-CUT_EXTRUDE_20_DEPTH, mode=Mode.SUBTRACT)

    # Sketch 30 → Extrude 8 (add)
    with BuildSketch(Plane.XY.offset(13)):
        Polygon((112.068054668, 85.310371985), (107.922916101, 89.712531664), (68.135584713, 52.248192829), (71.241913135, 46.867874176), align=None)
        Polygon((98.950505999, 108.394899743), (96.406644359, 113.779322647), (59.34542331, 66.089123081), (62.213357562, 61.121715243), align=None)
        Polygon((24.331505485, 98.768362958), (19.708497886, 96.891947732), (53.142901297, 66.089123081), (55.972189919, 69.160126413), align=None)
        Polygon((2.949445409, 86.456661235), (0, 84.758307493), (1.655787903, 38.106211971), (7.724521177, 40.569427371), align=None)
        Polygon((-1.747976688, 36.718440517), (-50.523677842, 57.700122779), (-54.943097479, 51.790017141), (-9.512673828, 32.247361853), align=None)
        Polygon((-45.889743184, 10.259239907), (-76.964412717, 39.337819671), (-81.650646335, 36.718440517), (-50.523677842, 7.590921232), align=None)
        Polygon((-73.350083184, -11.065799194), (-73.350083184, -5.618546996), (-120.801864013, 8.92508057), (-124.763106008, 4.691920389), align=None)
        Polygon((-66.087162089, -25.245346168), (-69.124877332, -21.644521246), (-136.839384074, -34.709590506), (-136.839384074, -42.002122059), align=None)
        Polygon((-53.307143918, -49.04163918), (-54.906692153, -44.610488149), (-104.794596754, -97.505321817), (-98.479079171, -101.151587593), align=None)
        Polygon((-41.540846023, -60.713761909), (-46.258304807, -57.99013581), (-58.318230755, -110.393979453), (-52.671585502, -109.080023344), align=None)
        Polygon((-18.687908296, -47.55024912), (-9.026220892, -89.07075422), (-4.414655194, -86.322046436), (-14.060109209, -44.871303324), align=None)
        Polygon((23.170697656, -24.36189812), (17.379921767, -73.477126749), (24.707933207, -72.604849894), (30.925113931, -19.873012476), align=None)
        Polygon((73.402847471, -42.379153747), (76.34838766, -40.674035966), (38.996415308, -13.595082114), (33.82884156, -17.619151598), align=None)
        Polygon((93.765137101, -31.377914027), (97.701664154, -28.312479616), (87.880521362, 13.893275169), (83.80631015, 12.978541014), align=None)
        Polygon((146.739106017, 26.600941785), (143.347989818, 31.496202041), (84.039636905, 23.317490482), (86.907571157, 18.350082644), align=None)
        Polygon((131.65478951, 48.607721162), (129.91497668, 54.398596303), (76.209726226, 38.263369501), (79.316054648, 32.883050848), align=None)
    extrude(amount=-EXTRUDE_8_DEPTH)

    # Sketch 31 → Cut-Extrude 22 (cut)
    with BuildSketch(Plane.XY.offset(13)):
        with Locations((-63.889241039, -0.513403553)):
            Circle(SKETCH_31_R)
        with Locations((-37.908478925, 14.486596447)):
            Circle(SKETCH_31_R)
        with Locations((-11.927716811, 29.486596447)):
            Circle(SKETCH_31_R)
        with Locations((14.053045302, 44.486596447)):
            Circle(SKETCH_31_R)
        with Locations((40.033807416, 59.486596447)):
            Circle(SKETCH_31_R)
        with Locations((-68.83058399, -18.954746504)):
            Circle(SKETCH_31_R)
        with Locations((-58.83058399, -36.27525458)):
            Circle(SKETCH_31_R)
        with Locations((-48.83058399, -53.595762655)):
            Circle(SKETCH_31_R)
        with Locations((83.671302789, 22.904237345)):
            Circle(SKETCH_31_R)
        with Locations((73.671302789, 40.22474542)):
            Circle(SKETCH_31_R)
        with Locations((63.671302789, 57.545253496)):
            Circle(SKETCH_31_R)
        with Locations((71.533807416, 4.926996009)):
            Circle(SKETCH_31_R)
        with Locations((45.553045302, -10.073003991)):
            Circle(SKETCH_31_R)
        with Locations((19.572283189, -25.073003991)):
            Circle(SKETCH_31_R)
        with Locations((-6.408478925, -40.073003991)):
            Circle(SKETCH_31_R)
        with Locations((-32.389241038, -55.073003991)):
            Circle(SKETCH_31_R)
    extrude(amount=-CUT_EXTRUDE_22_DEPTH, mode=Mode.SUBTRACT)

    # Sketch 32 → Cut-Extrude 23 (cut)
    with BuildSketch(Plane.XY.offset(3)):
        Rectangle(SKETCH_32_W, SKETCH_32_H)
    extrude(amount=-CUT_EXTRUDE_23_DEPTH, mode=Mode.SUBTRACT)

    # Sketch 33 → Cut-Extrude 24 (cut)
    with BuildSketch(Plane.XY.offset(13)):
        Polygon((639.612553216, -133.014254418), (169.771470014, -404.277130281), (-191.771834417, -613.014254418), (-397.136779793, -257.311734934), (-421.406889041, -215.274672611), (-626.771834417, 140.427846874), (-265.228529986, 349.164971011), (204.612553216, 620.427846874), align=None)
        Polygon((-65.228529986, 2.754809497), (-80.361672903, -5.98231464), (-74.996727527, -15.274672611), (-50.726618279, -57.311734934), (-45.361672903, -66.604092905), (-30.228529986, -57.866968768), (93.202391703, 13.395907095), (58.202391703, 74.01768536), align=None, mode=Mode.SUBTRACT)
    extrude(amount=-CUT_EXTRUDE_24_DEPTH, mode=Mode.SUBTRACT)

    # Sketch 34 → Cut-Extrude 25 (cut)
    with BuildSketch(Plane.XY.offset(13)):
        Rectangle(SKETCH_34_W, SKETCH_34_H)
    extrude(amount=-CUT_EXTRUDE_25_DEPTH, mode=Mode.SUBTRACT)


solid = part.part
